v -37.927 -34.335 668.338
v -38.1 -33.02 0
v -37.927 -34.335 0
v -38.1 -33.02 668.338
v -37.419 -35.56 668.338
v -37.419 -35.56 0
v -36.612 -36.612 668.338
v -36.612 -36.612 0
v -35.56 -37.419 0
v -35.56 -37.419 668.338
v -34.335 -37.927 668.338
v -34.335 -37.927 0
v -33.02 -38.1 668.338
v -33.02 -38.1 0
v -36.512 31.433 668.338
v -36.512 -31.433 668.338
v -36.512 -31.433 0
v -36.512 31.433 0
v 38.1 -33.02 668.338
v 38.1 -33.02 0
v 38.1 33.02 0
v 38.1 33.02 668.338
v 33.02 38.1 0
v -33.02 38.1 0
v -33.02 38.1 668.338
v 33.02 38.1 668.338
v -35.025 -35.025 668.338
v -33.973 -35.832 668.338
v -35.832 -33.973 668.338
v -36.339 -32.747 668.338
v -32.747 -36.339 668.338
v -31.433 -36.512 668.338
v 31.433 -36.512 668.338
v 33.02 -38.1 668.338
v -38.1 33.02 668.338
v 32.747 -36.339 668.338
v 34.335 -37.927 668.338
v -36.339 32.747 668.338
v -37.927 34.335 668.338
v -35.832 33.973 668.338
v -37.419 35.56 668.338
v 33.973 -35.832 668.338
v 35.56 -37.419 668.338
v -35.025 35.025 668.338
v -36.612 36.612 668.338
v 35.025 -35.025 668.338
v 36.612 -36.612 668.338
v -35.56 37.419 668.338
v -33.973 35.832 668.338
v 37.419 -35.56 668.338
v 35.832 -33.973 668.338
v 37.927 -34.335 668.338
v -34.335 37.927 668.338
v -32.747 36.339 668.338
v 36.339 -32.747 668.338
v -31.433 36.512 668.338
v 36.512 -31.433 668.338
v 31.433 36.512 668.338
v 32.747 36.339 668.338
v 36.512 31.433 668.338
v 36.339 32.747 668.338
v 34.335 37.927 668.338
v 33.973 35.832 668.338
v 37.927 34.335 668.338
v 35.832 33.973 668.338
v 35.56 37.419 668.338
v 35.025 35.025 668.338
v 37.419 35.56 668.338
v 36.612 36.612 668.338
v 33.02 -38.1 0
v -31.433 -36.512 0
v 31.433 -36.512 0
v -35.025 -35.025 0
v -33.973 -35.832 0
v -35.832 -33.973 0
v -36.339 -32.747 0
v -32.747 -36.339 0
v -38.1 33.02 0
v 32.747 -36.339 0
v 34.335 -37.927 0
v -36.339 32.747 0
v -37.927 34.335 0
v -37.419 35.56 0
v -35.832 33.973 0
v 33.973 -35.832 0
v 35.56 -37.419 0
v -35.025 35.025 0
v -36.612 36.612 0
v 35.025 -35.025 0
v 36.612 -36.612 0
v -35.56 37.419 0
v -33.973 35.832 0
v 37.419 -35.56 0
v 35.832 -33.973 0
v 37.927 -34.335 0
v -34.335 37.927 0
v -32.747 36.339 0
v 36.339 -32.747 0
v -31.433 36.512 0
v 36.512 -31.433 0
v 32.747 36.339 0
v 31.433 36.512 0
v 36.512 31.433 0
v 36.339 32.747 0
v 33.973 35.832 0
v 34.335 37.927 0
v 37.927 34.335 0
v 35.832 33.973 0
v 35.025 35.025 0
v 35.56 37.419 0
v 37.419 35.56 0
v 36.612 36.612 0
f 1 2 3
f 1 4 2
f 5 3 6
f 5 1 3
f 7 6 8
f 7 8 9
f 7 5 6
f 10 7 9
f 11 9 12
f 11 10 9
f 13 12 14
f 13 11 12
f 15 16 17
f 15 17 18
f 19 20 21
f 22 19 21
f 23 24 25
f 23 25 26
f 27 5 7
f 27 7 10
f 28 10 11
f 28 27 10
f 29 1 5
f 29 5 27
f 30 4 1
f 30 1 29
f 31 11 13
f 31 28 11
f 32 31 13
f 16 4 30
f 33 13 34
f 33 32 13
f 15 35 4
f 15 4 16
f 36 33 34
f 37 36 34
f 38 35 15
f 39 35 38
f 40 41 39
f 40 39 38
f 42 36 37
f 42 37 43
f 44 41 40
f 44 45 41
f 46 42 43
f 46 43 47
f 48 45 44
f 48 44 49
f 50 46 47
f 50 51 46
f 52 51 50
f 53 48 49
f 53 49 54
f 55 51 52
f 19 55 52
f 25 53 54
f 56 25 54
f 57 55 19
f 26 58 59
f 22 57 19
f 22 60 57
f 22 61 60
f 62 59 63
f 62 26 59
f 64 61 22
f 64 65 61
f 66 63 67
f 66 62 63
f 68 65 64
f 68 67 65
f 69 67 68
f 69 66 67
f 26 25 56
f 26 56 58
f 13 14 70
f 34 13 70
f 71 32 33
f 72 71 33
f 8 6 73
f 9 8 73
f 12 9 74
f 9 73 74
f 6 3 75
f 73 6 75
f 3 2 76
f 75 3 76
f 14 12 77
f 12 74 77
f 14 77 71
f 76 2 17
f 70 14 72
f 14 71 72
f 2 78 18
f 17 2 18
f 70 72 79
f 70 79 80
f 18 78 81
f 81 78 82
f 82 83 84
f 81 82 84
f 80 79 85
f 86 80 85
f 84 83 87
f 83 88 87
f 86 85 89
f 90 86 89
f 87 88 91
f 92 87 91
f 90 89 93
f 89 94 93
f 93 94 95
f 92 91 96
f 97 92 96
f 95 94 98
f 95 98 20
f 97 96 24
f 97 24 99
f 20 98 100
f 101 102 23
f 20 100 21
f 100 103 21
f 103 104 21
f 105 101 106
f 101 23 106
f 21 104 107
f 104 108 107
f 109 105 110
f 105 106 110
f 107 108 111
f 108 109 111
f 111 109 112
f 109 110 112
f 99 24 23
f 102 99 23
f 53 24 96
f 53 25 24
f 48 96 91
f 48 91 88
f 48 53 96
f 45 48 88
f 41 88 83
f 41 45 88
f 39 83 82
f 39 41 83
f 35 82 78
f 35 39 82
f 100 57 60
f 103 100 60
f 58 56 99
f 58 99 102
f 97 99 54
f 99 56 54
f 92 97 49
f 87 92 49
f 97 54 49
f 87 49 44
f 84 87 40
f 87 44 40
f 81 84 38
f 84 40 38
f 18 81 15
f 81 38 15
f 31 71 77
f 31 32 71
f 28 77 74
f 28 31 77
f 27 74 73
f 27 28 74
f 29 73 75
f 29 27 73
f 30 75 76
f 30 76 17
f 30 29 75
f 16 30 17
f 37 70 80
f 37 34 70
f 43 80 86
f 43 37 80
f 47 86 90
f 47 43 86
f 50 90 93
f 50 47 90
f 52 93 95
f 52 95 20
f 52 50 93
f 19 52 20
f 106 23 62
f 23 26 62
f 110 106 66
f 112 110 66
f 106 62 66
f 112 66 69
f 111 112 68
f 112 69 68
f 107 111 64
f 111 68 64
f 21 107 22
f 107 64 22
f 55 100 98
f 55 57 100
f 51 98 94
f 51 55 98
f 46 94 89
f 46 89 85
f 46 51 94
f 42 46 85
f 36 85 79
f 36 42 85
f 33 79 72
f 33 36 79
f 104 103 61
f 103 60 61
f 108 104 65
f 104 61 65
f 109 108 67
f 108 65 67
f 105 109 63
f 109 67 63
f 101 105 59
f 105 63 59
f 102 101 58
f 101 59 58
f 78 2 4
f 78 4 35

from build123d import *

# Parameters (mm, degrees)
F0_W     = 76.2
F0_H     = 76.2
F0_W_2   = 73.025
F0_H_2   = 73.025
F1_DEPTH = 668.3375
F2_R     = 5.08
F3_R     = 5.08
F4_R     = 5.08
F5_R     = 5.08
F6_R     = 5.08
F7_R     = 5.08


with BuildPart() as f1:
    # F0 (on Top) → F1 (new body)
    with BuildSketch(Plane.XY):
        Rectangle(F0_W, F0_H)
        Rectangle(F0_W_2, F0_H_2, mode=Mode.SUBTRACT)
    extrude(amount=F1_DEPTH)

    # F2
    f2_edges = [f1.edges().sort_by_distance(p)[0] for p in [
        (-38.1, -38.1, 334.16875),
    ]]
    fillet(f2_edges, radius=F2_R)

    # F3
    f3_edges = [f1.edges().sort_by_distance(p)[0] for p in [
        (38.1, -38.1, 334.16875),
        (38.1, 38.1, 334.16875),
    ]]
    fillet(f3_edges, radius=F3_R)

    # F4
    f4_edges = [f1.edges().sort_by_distance(p)[0] for p in [
        (-36.5125, 36.5125, 334.16875),
    ]]
    fillet(f4_edges, radius=F4_R)

    # F5
    f5_edges = [f1.edges().sort_by_distance(p)[0] for p in [
        (-38.1, 38.1, 334.16875),
        (36.5125, -36.5125, 334.16875),
    ]]
    fillet(f5_edges, radius=F5_R)

    # F6
    f6_edges = [f1.edges().sort_by_distance(p)[0] for p in [
        (-36.5125, -36.5125, 334.16875),
    ]]
    fillet(f6_edges, radius=F6_R)

    # F7
    f7_edges = [f1.edges().sort_by_distance(p)[0] for p in [
        (36.5125, 36.5125, 334.16875),
    ]]
    fillet(f7_edges, radius=F7_R)


solid = f1.part
